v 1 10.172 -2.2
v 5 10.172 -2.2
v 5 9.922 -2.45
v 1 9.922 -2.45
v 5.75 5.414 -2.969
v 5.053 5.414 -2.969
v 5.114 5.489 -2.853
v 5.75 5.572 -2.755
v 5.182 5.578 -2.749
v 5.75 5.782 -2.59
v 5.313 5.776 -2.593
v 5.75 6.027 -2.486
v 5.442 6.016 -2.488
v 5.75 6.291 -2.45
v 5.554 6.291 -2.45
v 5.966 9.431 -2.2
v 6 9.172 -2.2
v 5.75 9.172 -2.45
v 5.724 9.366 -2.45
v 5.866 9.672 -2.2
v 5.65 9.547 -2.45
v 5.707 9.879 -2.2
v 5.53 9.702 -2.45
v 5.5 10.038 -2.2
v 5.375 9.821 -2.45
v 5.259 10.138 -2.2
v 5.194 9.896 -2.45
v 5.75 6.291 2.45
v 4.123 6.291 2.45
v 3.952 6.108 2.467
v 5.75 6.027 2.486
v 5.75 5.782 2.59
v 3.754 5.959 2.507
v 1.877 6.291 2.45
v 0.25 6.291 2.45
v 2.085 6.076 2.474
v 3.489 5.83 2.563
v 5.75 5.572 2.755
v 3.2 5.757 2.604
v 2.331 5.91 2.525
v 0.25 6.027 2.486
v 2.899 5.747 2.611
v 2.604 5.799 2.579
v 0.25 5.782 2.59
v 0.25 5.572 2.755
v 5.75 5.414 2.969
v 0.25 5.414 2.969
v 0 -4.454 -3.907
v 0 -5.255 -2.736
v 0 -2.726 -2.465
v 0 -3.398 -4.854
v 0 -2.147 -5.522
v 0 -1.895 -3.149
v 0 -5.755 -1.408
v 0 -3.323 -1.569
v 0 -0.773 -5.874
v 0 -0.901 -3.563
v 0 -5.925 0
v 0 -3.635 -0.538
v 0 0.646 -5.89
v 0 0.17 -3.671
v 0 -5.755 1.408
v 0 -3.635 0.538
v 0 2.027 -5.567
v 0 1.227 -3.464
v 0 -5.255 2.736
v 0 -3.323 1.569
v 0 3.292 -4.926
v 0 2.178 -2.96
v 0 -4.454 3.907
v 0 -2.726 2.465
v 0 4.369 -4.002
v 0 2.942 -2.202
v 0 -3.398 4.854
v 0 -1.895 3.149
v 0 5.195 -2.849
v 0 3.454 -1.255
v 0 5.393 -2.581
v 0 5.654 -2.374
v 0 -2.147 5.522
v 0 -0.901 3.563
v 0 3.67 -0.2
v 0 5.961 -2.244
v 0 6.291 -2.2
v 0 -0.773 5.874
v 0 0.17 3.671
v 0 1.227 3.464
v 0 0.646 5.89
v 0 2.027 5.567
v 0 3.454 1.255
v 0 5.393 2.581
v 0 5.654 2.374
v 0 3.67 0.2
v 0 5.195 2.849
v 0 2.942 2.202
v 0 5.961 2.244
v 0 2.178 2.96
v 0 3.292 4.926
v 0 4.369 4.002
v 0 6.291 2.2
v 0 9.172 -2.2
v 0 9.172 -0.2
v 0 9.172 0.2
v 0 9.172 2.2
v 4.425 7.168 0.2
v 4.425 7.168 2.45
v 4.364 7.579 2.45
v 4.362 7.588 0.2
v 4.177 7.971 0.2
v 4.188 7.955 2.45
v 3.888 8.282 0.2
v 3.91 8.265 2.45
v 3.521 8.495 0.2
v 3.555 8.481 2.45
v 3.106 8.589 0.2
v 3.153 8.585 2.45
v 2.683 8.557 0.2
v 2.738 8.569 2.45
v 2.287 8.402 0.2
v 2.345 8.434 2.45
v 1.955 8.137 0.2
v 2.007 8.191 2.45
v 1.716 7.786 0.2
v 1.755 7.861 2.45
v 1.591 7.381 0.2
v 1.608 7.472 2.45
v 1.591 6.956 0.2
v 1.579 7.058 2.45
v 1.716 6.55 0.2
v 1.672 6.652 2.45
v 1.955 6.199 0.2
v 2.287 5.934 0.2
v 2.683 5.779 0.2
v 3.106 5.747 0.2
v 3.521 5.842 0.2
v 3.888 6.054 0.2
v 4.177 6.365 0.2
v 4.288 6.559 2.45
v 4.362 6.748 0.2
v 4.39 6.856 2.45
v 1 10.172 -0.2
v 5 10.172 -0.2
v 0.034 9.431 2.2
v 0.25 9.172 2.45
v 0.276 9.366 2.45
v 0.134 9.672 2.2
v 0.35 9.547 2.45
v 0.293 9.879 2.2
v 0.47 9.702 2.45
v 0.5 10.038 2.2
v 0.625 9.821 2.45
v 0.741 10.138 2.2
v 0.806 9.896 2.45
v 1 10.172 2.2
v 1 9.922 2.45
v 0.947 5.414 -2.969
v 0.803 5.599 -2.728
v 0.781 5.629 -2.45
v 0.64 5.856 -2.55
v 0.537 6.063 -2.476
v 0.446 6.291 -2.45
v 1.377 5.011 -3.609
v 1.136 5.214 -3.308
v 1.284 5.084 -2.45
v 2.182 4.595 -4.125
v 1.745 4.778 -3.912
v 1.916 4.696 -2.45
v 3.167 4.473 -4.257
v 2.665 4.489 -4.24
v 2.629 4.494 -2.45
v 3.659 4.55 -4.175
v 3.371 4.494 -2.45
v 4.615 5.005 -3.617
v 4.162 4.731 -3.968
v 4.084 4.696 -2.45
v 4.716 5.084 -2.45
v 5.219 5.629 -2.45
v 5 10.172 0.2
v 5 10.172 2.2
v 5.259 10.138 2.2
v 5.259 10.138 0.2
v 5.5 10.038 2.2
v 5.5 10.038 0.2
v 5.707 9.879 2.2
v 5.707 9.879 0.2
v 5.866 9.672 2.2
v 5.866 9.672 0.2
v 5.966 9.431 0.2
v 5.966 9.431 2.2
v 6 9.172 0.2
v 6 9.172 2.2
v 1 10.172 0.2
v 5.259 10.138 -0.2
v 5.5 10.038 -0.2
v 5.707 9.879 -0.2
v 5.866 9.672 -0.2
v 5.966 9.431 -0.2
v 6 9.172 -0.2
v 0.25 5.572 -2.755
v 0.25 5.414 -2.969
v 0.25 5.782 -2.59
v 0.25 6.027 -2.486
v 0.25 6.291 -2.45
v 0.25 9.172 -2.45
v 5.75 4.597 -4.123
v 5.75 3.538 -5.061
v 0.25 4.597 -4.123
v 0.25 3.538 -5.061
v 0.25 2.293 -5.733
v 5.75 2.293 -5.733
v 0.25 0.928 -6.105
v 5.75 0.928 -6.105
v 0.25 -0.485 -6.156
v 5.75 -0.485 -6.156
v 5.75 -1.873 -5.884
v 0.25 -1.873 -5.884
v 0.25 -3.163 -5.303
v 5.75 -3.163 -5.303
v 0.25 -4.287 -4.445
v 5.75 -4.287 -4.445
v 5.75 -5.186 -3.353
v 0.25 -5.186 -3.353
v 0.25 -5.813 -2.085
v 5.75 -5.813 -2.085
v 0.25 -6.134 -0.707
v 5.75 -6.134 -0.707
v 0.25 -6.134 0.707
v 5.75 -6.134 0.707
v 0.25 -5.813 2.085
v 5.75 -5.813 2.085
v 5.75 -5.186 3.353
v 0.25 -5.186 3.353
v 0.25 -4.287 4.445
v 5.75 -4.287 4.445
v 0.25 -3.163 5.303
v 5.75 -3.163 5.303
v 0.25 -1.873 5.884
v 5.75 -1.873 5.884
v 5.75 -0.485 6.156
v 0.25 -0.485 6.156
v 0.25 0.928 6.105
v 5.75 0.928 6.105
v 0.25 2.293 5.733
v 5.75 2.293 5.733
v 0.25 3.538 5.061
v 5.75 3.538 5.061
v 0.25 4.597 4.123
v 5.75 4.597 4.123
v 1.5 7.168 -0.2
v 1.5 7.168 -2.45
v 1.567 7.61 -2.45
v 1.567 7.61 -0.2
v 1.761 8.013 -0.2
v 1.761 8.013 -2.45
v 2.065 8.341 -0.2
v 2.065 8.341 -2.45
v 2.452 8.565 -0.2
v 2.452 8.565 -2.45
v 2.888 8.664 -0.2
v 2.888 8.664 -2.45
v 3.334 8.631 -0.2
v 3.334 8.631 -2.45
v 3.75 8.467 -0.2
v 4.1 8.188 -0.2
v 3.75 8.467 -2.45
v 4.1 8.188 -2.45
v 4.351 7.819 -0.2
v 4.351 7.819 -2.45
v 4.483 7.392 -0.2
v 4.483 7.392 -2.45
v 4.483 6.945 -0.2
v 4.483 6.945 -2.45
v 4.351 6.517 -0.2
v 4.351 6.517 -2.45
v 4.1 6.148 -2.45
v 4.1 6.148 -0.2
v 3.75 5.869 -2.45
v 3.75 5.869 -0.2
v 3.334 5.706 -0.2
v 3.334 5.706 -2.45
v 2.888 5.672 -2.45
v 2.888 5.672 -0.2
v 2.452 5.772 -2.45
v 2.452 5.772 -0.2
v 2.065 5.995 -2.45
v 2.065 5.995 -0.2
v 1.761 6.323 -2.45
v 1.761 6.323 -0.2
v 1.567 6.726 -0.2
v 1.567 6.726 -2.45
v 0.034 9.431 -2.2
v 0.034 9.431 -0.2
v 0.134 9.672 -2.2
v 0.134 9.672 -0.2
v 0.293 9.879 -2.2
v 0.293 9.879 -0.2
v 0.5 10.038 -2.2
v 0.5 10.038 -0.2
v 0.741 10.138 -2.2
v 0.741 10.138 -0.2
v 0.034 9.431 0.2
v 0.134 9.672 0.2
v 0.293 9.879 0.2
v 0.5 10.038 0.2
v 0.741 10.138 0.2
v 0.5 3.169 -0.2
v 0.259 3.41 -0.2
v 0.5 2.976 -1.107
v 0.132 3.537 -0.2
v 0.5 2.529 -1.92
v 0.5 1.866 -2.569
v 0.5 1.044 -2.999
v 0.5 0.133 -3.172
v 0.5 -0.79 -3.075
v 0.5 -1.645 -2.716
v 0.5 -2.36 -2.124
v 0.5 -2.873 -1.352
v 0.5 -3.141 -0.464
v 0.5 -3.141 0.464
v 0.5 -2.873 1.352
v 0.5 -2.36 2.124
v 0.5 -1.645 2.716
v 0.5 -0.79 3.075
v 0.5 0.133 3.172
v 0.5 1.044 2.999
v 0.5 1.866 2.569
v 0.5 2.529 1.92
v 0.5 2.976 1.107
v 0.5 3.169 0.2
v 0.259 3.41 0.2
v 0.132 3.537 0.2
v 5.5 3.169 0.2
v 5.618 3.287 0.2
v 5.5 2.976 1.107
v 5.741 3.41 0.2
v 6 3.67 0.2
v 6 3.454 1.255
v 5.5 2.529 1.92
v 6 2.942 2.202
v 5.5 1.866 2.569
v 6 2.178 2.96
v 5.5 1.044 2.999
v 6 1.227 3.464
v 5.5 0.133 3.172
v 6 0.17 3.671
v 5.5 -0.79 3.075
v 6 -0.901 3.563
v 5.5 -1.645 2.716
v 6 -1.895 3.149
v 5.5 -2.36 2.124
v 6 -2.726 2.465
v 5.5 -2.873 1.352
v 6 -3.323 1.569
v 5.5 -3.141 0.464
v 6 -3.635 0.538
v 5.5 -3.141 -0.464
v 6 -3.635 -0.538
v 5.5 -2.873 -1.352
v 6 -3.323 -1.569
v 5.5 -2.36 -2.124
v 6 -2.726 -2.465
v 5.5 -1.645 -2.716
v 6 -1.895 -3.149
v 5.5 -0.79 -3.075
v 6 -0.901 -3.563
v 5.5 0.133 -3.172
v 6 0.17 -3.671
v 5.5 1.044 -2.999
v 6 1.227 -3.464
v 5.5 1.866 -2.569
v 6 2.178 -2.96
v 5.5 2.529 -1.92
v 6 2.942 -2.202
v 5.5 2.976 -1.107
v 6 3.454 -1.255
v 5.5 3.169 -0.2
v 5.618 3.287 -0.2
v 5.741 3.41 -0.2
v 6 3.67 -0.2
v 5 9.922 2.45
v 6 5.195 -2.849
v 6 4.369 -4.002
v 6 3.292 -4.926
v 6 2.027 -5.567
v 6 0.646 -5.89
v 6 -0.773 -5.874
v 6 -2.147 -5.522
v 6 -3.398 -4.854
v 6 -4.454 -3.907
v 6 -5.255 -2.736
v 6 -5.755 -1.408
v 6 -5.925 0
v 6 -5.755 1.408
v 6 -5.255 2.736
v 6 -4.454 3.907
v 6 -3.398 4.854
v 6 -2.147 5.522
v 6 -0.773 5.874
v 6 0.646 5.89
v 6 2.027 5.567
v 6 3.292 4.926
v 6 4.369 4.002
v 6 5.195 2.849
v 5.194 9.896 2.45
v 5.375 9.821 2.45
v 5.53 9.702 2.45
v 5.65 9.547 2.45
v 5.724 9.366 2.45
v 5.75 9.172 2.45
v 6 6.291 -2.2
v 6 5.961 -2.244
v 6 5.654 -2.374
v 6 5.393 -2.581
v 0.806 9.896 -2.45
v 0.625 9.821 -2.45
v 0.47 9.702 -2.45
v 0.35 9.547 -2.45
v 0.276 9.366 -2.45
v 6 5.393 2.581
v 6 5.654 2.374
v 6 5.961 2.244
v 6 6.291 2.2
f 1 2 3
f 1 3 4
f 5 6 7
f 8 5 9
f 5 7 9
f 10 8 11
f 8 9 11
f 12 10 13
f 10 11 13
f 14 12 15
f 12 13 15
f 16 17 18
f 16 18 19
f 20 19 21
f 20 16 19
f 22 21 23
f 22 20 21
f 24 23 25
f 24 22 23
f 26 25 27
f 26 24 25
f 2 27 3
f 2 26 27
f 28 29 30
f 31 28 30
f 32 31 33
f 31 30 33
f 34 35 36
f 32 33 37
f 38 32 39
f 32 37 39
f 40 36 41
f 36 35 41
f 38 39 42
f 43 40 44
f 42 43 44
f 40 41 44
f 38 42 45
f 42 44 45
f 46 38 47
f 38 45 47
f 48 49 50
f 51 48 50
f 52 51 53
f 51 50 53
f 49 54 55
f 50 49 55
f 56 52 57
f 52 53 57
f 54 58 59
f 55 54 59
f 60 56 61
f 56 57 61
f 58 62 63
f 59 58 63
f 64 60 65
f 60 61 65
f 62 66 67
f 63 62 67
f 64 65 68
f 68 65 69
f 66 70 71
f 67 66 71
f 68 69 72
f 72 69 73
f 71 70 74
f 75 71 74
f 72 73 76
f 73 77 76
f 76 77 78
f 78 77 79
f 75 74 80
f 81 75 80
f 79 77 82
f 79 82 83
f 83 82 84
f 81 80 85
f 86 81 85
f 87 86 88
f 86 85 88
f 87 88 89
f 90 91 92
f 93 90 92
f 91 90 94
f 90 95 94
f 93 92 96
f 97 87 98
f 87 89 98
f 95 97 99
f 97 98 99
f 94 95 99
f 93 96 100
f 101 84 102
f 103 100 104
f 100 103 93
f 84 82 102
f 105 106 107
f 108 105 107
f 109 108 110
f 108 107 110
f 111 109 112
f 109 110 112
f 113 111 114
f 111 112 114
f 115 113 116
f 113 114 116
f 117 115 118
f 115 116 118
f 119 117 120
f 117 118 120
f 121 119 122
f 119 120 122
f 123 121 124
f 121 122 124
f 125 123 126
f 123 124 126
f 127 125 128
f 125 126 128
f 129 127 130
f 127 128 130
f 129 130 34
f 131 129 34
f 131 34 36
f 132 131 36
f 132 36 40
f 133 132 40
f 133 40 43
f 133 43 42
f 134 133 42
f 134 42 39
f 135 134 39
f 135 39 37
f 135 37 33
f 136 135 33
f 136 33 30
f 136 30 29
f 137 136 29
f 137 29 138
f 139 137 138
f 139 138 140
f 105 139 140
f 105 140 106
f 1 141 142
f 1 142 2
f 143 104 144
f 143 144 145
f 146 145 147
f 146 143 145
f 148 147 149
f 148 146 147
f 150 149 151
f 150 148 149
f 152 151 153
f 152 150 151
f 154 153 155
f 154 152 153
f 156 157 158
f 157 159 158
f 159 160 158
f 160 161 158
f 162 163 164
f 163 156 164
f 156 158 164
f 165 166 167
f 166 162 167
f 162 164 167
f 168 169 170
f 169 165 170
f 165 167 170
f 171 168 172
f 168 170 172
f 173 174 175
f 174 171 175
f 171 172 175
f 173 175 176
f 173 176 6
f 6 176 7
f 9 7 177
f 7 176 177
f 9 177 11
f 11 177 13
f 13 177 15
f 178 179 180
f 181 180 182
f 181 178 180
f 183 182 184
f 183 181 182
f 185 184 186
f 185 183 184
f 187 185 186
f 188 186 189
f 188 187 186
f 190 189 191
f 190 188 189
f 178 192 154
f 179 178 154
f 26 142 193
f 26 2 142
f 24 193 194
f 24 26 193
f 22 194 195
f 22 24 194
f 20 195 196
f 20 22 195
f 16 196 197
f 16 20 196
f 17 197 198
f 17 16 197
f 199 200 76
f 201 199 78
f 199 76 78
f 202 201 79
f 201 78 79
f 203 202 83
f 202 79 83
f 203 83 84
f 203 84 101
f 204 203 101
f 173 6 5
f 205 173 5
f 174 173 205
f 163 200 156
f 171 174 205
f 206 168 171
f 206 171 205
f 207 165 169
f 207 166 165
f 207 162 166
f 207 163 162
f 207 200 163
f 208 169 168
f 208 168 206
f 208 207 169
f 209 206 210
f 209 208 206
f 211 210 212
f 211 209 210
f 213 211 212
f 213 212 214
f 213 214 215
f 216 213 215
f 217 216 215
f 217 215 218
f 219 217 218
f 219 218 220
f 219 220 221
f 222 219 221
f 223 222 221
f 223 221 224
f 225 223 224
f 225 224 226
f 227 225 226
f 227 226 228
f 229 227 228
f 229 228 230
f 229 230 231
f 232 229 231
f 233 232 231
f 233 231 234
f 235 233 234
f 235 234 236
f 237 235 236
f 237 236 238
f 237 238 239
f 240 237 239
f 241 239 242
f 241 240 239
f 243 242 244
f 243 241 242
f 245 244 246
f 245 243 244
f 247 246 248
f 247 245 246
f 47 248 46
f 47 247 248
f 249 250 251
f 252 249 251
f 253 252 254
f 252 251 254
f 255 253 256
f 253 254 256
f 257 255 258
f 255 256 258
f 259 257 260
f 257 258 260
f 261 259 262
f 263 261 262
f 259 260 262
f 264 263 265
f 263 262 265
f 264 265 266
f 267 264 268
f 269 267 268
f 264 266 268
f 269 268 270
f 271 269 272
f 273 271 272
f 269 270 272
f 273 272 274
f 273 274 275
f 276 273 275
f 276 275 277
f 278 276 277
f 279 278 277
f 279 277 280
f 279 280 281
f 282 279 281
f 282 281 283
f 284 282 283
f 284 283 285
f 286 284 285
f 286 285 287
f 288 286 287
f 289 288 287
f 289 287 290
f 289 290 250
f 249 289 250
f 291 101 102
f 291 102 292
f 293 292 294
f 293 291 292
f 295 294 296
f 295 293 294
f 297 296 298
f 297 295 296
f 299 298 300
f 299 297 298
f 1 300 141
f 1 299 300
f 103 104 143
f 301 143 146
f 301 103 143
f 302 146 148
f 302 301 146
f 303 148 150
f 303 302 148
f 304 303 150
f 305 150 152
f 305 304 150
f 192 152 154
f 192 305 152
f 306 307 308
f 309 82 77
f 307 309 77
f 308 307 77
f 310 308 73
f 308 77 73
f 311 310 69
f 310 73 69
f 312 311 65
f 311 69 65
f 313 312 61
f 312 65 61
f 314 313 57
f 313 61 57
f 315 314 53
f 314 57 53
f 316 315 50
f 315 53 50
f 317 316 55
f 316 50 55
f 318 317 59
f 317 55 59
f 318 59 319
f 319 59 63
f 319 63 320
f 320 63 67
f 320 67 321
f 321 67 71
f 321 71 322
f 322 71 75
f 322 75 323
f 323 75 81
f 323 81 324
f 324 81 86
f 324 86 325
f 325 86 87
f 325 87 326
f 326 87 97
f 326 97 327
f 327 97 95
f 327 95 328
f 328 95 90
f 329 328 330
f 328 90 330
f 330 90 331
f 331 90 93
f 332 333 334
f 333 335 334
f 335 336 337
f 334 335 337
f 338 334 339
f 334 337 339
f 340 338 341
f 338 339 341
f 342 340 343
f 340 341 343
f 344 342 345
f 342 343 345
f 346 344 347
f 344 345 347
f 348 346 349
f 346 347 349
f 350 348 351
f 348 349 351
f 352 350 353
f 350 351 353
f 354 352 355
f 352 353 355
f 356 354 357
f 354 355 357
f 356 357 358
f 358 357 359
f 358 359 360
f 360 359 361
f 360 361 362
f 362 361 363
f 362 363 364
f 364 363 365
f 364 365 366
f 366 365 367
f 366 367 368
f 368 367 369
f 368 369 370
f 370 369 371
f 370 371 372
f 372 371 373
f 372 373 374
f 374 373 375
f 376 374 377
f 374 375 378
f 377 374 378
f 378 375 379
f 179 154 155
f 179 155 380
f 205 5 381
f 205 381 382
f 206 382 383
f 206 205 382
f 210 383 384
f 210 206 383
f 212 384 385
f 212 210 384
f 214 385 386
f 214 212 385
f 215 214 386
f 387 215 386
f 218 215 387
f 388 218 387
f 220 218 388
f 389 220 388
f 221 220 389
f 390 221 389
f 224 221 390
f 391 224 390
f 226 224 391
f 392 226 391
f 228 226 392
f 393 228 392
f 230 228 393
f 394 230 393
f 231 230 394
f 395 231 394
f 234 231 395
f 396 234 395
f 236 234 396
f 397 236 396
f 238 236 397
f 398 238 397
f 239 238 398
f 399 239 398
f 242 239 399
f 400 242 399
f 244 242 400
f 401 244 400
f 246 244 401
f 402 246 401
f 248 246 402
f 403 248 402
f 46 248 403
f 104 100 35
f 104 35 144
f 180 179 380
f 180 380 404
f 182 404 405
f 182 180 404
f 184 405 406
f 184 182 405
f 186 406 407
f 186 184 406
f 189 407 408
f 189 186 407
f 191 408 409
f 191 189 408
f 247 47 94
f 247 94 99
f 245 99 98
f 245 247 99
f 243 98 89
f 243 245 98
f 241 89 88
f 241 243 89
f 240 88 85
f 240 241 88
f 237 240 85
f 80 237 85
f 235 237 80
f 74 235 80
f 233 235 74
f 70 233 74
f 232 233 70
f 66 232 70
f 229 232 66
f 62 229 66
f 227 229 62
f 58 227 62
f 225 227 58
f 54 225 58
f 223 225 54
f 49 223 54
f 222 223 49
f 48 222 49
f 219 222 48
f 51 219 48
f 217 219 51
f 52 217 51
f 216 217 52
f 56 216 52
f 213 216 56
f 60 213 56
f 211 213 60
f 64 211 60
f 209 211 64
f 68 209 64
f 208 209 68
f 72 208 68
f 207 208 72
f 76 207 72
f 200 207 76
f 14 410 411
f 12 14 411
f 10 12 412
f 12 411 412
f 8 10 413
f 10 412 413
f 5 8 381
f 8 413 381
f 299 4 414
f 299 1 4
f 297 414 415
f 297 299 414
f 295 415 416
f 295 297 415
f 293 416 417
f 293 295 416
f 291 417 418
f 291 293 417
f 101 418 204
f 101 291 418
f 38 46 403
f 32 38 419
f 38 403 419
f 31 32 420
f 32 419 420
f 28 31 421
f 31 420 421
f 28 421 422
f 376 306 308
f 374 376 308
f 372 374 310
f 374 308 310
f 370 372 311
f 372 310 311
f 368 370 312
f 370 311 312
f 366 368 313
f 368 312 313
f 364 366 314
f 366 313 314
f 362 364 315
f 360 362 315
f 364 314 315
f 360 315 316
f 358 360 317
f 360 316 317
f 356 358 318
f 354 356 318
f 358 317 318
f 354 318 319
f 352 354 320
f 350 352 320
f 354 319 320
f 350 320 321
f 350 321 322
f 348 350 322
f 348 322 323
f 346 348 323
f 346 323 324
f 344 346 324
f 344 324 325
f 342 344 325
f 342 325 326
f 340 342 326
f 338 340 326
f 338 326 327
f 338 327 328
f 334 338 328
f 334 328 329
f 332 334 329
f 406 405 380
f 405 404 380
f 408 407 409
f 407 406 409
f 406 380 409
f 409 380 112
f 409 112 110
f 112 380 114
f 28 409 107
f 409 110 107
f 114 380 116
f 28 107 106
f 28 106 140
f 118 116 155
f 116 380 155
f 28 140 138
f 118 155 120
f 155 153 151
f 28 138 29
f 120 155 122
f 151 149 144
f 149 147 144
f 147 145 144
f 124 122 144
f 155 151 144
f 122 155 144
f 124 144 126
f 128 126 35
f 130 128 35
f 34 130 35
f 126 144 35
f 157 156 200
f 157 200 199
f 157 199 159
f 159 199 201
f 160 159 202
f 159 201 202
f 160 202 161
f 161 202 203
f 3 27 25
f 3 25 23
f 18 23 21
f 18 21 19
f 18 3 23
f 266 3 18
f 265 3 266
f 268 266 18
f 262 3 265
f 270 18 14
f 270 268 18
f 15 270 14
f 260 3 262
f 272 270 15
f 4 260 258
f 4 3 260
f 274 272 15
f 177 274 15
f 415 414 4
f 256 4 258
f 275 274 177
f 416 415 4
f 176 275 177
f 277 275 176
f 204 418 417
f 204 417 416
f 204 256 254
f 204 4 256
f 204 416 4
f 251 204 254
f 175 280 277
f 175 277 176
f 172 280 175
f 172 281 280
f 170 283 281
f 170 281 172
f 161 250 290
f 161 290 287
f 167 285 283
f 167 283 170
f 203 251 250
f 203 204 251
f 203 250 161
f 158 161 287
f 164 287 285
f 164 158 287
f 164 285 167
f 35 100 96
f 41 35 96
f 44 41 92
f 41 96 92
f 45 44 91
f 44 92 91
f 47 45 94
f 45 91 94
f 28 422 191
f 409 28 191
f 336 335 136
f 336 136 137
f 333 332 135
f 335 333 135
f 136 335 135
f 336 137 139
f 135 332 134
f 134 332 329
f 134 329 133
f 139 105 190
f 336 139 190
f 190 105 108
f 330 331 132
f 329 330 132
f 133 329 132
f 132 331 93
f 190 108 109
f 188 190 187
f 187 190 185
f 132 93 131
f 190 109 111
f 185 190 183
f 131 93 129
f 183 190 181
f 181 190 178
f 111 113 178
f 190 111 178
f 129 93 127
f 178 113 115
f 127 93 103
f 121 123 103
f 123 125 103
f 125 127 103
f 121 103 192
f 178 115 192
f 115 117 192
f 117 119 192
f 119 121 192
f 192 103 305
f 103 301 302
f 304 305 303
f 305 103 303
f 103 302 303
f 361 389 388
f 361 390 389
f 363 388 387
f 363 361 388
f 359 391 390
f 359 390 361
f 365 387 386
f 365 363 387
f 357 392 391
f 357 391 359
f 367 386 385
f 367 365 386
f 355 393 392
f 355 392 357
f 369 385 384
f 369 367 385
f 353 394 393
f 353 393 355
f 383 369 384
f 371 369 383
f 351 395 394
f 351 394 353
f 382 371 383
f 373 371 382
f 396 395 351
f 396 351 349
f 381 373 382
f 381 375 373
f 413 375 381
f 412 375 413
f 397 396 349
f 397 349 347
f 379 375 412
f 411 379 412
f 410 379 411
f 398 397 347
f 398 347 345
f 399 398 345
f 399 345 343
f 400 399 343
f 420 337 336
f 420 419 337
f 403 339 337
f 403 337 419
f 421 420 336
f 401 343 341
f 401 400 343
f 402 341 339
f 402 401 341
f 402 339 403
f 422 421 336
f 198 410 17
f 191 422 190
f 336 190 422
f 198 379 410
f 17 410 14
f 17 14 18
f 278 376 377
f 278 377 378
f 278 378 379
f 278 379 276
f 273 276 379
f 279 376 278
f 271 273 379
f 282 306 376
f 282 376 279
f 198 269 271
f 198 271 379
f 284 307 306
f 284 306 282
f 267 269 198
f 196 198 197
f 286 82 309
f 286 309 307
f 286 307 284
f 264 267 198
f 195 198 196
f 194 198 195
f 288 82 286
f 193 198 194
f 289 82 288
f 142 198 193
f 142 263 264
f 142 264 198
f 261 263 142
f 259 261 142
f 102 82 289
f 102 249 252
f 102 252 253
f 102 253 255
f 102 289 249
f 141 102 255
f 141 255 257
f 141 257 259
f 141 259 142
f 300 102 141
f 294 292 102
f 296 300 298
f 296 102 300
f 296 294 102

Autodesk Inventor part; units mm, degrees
ref_plane "YZ Plane" through (0, 0, 0) normal (1, 0, 0) x (0, 1, 0)
ref_plane "XZ Plane" through (0, 0, 0) normal (0, 1, 0) x (-1, 0, 0)
ref_plane "XY Plane" through (0, 0, 0) normal (0, 0, 1) x (1, 0, 0)
sketch "Sketch1" plane through (0, 0, 0) normal (1, 0, 0) x (0, 1, 0)
  line L0 (0, 8.645) -> (0, -8.645) projected
  line L1 (-9.4444, 0) -> (13.4411, 0) projected
  circle A0 centre (0, 0) radius 6.175
  circle A1 centre (0, 0) radius 3.175
  line L2 (3.1687, -0.2) -> (6.1718, -0.2)
  line L3 (3.1687, 0.2) -> (6.1718, 0.2)
  line L4 (6.1718, 0.2) -> (10.1718, 0.2)
  line L5 (10.1718, 0.2) -> (10.1718, 2.45)
  line L6 (10.1718, 2.45) -> (5.6682, 2.45)
  line L7 (6.1718, -0.2) -> (10.1718, -0.2)
  line L8 (10.1718, -0.2) -> (10.1718, -2.45)
  line L9 (10.1718, -2.45) -> (5.6682, -2.45)
  dimension "d0" = 6.35
  dimension "d1" = 3
  dimension "d2" = 0.2
  dimension "d3" = 4
  dimension "d4" = 2.25
extrude "Extrusion1" add sketch "Sketch1" along normal blind 6 contours A0 L3 A1 L0 | L0 A1 L1 A0 | L6 L5 L4 A0 | L1 A1 L0 A0 | L0 A1 L2 A0 | A0 L7 L8 L9
sketch "Sketch2" plane through (0, 5.6682, -2.45) normal (0, 0, -1) x (-1, 0, 0)
  line L0 (0, 4.5036) -> (-6, 4.5036) projected
  circle A0 centre (-3, 1.5) radius 1.5
  circle A1 centre (-3, 1.5) radius 2.6 construction
  line L1 (0, 0) -> (-6, 0) projected
  point P0 (0, -5.6682)
  point P1 (-3, 4.5036)
  dimension "d8" = 3
  dimension "d24" = 5.2
extrude "Extrusion2" cut sketch "Sketch2" against normal up to surface (2.25 mm away)
sketch "Sketch4" plane through (0, 5.6682, 2.45) normal (0, 0, 1) x (1, 0, 0)
  circle A0 centre (3, 1.5) radius 1.5 projected
  circle A1 centre (3, 1.5) radius 1.5 projected
  circle A2 centre (3, 1.5) radius 1.425
  point P0 (0, -5.6682)
  point P1 (3, 0)
  dimension "d14" = 2.85
extrude "Extrusion4" cut sketch "Sketch4" against normal through all contours A2
fillet "Fillet2" radius 1 7 edges at (6, 10.1718, 1.325) (3, 5.6682, 2.45) (0, 10.1718, 1.325) (0, 10.1718, -1.325) (6, 10.1718, -1.325) (1.5, 5.6682, -2.45) (4.5, 5.6682, -2.45)
chamfer "Chamfer1" distance 0.5 angle 45 2 edges at (6, -3.175, 0) (0, -3.175, 0)
sketch "Sketch5" plane through (0, 6.2911, -2.45) normal (0, 0, -1) x (-1, 0, 0)
  arc A0 (-1.7831, 0) -> (-4.2169, 0) centre (-3, 0.8771) ccw projected
  circle A1 centre (-3, 0.8771) radius 2.7
  circle A2 centre (-3, 0.8771) radius 1.5
  point P0 (0, -6.2911)
  dimension "d25" = 5.4
extrude "Extrusion5" cut sketch "Sketch5" along normal through all contours A2 A0 | A1
chamfer "Chamfer2" distance 0.25 angle 45 16 edges at (6, -6.175, 0) (6, 9.1718, -1.325) (6, 7.7314, -2.45) (5.7071, 9.8789, -2.45) (3, 10.1718, -2.45) (0.2929, 9.8789, -2.45) (0, 7.7314, -2.45) (0, 9.1718, -1.325) (0, -6.175, 0) (0, 9.1718, 1.325) (0, 7.7314, 2.45) (0.2929, 9.8789, 2.45) (3, 10.1718, 2.45) (5.7071, 9.8789, 2.45) (6, 7.7314, 2.45) (6, 9.1718, 1.325)
sketch "Sketch3" plane through (0, 5.6682, 2.45) normal (0, 0, 1) x (1, 0, 0)
  circle A0 centre (2.5, 3.2518) radius 1.5 projected
  circle A1 centre (2.5, 3.2518) radius 1.5 projected
  line L0 (4.3187, 6.4018) -> (6.1373, 3.2518)
  line L1 (6.1373, 3.2518) -> (4.3187, 0.1018)
  line L2 (4.3187, 0.1018) -> (0.6813, 0.1018)
  line L3 (0.6813, 0.1018) -> (-1.1373, 3.2518)
  line L4 (-1.1373, 3.2518) -> (0.6813, 6.4018)
  line L5 (0.6813, 6.4018) -> (4.3187, 6.4018)
  point P0 (0, -5.6682)
  dimension "d11" = 6.3
properties part number "pipeClap"
